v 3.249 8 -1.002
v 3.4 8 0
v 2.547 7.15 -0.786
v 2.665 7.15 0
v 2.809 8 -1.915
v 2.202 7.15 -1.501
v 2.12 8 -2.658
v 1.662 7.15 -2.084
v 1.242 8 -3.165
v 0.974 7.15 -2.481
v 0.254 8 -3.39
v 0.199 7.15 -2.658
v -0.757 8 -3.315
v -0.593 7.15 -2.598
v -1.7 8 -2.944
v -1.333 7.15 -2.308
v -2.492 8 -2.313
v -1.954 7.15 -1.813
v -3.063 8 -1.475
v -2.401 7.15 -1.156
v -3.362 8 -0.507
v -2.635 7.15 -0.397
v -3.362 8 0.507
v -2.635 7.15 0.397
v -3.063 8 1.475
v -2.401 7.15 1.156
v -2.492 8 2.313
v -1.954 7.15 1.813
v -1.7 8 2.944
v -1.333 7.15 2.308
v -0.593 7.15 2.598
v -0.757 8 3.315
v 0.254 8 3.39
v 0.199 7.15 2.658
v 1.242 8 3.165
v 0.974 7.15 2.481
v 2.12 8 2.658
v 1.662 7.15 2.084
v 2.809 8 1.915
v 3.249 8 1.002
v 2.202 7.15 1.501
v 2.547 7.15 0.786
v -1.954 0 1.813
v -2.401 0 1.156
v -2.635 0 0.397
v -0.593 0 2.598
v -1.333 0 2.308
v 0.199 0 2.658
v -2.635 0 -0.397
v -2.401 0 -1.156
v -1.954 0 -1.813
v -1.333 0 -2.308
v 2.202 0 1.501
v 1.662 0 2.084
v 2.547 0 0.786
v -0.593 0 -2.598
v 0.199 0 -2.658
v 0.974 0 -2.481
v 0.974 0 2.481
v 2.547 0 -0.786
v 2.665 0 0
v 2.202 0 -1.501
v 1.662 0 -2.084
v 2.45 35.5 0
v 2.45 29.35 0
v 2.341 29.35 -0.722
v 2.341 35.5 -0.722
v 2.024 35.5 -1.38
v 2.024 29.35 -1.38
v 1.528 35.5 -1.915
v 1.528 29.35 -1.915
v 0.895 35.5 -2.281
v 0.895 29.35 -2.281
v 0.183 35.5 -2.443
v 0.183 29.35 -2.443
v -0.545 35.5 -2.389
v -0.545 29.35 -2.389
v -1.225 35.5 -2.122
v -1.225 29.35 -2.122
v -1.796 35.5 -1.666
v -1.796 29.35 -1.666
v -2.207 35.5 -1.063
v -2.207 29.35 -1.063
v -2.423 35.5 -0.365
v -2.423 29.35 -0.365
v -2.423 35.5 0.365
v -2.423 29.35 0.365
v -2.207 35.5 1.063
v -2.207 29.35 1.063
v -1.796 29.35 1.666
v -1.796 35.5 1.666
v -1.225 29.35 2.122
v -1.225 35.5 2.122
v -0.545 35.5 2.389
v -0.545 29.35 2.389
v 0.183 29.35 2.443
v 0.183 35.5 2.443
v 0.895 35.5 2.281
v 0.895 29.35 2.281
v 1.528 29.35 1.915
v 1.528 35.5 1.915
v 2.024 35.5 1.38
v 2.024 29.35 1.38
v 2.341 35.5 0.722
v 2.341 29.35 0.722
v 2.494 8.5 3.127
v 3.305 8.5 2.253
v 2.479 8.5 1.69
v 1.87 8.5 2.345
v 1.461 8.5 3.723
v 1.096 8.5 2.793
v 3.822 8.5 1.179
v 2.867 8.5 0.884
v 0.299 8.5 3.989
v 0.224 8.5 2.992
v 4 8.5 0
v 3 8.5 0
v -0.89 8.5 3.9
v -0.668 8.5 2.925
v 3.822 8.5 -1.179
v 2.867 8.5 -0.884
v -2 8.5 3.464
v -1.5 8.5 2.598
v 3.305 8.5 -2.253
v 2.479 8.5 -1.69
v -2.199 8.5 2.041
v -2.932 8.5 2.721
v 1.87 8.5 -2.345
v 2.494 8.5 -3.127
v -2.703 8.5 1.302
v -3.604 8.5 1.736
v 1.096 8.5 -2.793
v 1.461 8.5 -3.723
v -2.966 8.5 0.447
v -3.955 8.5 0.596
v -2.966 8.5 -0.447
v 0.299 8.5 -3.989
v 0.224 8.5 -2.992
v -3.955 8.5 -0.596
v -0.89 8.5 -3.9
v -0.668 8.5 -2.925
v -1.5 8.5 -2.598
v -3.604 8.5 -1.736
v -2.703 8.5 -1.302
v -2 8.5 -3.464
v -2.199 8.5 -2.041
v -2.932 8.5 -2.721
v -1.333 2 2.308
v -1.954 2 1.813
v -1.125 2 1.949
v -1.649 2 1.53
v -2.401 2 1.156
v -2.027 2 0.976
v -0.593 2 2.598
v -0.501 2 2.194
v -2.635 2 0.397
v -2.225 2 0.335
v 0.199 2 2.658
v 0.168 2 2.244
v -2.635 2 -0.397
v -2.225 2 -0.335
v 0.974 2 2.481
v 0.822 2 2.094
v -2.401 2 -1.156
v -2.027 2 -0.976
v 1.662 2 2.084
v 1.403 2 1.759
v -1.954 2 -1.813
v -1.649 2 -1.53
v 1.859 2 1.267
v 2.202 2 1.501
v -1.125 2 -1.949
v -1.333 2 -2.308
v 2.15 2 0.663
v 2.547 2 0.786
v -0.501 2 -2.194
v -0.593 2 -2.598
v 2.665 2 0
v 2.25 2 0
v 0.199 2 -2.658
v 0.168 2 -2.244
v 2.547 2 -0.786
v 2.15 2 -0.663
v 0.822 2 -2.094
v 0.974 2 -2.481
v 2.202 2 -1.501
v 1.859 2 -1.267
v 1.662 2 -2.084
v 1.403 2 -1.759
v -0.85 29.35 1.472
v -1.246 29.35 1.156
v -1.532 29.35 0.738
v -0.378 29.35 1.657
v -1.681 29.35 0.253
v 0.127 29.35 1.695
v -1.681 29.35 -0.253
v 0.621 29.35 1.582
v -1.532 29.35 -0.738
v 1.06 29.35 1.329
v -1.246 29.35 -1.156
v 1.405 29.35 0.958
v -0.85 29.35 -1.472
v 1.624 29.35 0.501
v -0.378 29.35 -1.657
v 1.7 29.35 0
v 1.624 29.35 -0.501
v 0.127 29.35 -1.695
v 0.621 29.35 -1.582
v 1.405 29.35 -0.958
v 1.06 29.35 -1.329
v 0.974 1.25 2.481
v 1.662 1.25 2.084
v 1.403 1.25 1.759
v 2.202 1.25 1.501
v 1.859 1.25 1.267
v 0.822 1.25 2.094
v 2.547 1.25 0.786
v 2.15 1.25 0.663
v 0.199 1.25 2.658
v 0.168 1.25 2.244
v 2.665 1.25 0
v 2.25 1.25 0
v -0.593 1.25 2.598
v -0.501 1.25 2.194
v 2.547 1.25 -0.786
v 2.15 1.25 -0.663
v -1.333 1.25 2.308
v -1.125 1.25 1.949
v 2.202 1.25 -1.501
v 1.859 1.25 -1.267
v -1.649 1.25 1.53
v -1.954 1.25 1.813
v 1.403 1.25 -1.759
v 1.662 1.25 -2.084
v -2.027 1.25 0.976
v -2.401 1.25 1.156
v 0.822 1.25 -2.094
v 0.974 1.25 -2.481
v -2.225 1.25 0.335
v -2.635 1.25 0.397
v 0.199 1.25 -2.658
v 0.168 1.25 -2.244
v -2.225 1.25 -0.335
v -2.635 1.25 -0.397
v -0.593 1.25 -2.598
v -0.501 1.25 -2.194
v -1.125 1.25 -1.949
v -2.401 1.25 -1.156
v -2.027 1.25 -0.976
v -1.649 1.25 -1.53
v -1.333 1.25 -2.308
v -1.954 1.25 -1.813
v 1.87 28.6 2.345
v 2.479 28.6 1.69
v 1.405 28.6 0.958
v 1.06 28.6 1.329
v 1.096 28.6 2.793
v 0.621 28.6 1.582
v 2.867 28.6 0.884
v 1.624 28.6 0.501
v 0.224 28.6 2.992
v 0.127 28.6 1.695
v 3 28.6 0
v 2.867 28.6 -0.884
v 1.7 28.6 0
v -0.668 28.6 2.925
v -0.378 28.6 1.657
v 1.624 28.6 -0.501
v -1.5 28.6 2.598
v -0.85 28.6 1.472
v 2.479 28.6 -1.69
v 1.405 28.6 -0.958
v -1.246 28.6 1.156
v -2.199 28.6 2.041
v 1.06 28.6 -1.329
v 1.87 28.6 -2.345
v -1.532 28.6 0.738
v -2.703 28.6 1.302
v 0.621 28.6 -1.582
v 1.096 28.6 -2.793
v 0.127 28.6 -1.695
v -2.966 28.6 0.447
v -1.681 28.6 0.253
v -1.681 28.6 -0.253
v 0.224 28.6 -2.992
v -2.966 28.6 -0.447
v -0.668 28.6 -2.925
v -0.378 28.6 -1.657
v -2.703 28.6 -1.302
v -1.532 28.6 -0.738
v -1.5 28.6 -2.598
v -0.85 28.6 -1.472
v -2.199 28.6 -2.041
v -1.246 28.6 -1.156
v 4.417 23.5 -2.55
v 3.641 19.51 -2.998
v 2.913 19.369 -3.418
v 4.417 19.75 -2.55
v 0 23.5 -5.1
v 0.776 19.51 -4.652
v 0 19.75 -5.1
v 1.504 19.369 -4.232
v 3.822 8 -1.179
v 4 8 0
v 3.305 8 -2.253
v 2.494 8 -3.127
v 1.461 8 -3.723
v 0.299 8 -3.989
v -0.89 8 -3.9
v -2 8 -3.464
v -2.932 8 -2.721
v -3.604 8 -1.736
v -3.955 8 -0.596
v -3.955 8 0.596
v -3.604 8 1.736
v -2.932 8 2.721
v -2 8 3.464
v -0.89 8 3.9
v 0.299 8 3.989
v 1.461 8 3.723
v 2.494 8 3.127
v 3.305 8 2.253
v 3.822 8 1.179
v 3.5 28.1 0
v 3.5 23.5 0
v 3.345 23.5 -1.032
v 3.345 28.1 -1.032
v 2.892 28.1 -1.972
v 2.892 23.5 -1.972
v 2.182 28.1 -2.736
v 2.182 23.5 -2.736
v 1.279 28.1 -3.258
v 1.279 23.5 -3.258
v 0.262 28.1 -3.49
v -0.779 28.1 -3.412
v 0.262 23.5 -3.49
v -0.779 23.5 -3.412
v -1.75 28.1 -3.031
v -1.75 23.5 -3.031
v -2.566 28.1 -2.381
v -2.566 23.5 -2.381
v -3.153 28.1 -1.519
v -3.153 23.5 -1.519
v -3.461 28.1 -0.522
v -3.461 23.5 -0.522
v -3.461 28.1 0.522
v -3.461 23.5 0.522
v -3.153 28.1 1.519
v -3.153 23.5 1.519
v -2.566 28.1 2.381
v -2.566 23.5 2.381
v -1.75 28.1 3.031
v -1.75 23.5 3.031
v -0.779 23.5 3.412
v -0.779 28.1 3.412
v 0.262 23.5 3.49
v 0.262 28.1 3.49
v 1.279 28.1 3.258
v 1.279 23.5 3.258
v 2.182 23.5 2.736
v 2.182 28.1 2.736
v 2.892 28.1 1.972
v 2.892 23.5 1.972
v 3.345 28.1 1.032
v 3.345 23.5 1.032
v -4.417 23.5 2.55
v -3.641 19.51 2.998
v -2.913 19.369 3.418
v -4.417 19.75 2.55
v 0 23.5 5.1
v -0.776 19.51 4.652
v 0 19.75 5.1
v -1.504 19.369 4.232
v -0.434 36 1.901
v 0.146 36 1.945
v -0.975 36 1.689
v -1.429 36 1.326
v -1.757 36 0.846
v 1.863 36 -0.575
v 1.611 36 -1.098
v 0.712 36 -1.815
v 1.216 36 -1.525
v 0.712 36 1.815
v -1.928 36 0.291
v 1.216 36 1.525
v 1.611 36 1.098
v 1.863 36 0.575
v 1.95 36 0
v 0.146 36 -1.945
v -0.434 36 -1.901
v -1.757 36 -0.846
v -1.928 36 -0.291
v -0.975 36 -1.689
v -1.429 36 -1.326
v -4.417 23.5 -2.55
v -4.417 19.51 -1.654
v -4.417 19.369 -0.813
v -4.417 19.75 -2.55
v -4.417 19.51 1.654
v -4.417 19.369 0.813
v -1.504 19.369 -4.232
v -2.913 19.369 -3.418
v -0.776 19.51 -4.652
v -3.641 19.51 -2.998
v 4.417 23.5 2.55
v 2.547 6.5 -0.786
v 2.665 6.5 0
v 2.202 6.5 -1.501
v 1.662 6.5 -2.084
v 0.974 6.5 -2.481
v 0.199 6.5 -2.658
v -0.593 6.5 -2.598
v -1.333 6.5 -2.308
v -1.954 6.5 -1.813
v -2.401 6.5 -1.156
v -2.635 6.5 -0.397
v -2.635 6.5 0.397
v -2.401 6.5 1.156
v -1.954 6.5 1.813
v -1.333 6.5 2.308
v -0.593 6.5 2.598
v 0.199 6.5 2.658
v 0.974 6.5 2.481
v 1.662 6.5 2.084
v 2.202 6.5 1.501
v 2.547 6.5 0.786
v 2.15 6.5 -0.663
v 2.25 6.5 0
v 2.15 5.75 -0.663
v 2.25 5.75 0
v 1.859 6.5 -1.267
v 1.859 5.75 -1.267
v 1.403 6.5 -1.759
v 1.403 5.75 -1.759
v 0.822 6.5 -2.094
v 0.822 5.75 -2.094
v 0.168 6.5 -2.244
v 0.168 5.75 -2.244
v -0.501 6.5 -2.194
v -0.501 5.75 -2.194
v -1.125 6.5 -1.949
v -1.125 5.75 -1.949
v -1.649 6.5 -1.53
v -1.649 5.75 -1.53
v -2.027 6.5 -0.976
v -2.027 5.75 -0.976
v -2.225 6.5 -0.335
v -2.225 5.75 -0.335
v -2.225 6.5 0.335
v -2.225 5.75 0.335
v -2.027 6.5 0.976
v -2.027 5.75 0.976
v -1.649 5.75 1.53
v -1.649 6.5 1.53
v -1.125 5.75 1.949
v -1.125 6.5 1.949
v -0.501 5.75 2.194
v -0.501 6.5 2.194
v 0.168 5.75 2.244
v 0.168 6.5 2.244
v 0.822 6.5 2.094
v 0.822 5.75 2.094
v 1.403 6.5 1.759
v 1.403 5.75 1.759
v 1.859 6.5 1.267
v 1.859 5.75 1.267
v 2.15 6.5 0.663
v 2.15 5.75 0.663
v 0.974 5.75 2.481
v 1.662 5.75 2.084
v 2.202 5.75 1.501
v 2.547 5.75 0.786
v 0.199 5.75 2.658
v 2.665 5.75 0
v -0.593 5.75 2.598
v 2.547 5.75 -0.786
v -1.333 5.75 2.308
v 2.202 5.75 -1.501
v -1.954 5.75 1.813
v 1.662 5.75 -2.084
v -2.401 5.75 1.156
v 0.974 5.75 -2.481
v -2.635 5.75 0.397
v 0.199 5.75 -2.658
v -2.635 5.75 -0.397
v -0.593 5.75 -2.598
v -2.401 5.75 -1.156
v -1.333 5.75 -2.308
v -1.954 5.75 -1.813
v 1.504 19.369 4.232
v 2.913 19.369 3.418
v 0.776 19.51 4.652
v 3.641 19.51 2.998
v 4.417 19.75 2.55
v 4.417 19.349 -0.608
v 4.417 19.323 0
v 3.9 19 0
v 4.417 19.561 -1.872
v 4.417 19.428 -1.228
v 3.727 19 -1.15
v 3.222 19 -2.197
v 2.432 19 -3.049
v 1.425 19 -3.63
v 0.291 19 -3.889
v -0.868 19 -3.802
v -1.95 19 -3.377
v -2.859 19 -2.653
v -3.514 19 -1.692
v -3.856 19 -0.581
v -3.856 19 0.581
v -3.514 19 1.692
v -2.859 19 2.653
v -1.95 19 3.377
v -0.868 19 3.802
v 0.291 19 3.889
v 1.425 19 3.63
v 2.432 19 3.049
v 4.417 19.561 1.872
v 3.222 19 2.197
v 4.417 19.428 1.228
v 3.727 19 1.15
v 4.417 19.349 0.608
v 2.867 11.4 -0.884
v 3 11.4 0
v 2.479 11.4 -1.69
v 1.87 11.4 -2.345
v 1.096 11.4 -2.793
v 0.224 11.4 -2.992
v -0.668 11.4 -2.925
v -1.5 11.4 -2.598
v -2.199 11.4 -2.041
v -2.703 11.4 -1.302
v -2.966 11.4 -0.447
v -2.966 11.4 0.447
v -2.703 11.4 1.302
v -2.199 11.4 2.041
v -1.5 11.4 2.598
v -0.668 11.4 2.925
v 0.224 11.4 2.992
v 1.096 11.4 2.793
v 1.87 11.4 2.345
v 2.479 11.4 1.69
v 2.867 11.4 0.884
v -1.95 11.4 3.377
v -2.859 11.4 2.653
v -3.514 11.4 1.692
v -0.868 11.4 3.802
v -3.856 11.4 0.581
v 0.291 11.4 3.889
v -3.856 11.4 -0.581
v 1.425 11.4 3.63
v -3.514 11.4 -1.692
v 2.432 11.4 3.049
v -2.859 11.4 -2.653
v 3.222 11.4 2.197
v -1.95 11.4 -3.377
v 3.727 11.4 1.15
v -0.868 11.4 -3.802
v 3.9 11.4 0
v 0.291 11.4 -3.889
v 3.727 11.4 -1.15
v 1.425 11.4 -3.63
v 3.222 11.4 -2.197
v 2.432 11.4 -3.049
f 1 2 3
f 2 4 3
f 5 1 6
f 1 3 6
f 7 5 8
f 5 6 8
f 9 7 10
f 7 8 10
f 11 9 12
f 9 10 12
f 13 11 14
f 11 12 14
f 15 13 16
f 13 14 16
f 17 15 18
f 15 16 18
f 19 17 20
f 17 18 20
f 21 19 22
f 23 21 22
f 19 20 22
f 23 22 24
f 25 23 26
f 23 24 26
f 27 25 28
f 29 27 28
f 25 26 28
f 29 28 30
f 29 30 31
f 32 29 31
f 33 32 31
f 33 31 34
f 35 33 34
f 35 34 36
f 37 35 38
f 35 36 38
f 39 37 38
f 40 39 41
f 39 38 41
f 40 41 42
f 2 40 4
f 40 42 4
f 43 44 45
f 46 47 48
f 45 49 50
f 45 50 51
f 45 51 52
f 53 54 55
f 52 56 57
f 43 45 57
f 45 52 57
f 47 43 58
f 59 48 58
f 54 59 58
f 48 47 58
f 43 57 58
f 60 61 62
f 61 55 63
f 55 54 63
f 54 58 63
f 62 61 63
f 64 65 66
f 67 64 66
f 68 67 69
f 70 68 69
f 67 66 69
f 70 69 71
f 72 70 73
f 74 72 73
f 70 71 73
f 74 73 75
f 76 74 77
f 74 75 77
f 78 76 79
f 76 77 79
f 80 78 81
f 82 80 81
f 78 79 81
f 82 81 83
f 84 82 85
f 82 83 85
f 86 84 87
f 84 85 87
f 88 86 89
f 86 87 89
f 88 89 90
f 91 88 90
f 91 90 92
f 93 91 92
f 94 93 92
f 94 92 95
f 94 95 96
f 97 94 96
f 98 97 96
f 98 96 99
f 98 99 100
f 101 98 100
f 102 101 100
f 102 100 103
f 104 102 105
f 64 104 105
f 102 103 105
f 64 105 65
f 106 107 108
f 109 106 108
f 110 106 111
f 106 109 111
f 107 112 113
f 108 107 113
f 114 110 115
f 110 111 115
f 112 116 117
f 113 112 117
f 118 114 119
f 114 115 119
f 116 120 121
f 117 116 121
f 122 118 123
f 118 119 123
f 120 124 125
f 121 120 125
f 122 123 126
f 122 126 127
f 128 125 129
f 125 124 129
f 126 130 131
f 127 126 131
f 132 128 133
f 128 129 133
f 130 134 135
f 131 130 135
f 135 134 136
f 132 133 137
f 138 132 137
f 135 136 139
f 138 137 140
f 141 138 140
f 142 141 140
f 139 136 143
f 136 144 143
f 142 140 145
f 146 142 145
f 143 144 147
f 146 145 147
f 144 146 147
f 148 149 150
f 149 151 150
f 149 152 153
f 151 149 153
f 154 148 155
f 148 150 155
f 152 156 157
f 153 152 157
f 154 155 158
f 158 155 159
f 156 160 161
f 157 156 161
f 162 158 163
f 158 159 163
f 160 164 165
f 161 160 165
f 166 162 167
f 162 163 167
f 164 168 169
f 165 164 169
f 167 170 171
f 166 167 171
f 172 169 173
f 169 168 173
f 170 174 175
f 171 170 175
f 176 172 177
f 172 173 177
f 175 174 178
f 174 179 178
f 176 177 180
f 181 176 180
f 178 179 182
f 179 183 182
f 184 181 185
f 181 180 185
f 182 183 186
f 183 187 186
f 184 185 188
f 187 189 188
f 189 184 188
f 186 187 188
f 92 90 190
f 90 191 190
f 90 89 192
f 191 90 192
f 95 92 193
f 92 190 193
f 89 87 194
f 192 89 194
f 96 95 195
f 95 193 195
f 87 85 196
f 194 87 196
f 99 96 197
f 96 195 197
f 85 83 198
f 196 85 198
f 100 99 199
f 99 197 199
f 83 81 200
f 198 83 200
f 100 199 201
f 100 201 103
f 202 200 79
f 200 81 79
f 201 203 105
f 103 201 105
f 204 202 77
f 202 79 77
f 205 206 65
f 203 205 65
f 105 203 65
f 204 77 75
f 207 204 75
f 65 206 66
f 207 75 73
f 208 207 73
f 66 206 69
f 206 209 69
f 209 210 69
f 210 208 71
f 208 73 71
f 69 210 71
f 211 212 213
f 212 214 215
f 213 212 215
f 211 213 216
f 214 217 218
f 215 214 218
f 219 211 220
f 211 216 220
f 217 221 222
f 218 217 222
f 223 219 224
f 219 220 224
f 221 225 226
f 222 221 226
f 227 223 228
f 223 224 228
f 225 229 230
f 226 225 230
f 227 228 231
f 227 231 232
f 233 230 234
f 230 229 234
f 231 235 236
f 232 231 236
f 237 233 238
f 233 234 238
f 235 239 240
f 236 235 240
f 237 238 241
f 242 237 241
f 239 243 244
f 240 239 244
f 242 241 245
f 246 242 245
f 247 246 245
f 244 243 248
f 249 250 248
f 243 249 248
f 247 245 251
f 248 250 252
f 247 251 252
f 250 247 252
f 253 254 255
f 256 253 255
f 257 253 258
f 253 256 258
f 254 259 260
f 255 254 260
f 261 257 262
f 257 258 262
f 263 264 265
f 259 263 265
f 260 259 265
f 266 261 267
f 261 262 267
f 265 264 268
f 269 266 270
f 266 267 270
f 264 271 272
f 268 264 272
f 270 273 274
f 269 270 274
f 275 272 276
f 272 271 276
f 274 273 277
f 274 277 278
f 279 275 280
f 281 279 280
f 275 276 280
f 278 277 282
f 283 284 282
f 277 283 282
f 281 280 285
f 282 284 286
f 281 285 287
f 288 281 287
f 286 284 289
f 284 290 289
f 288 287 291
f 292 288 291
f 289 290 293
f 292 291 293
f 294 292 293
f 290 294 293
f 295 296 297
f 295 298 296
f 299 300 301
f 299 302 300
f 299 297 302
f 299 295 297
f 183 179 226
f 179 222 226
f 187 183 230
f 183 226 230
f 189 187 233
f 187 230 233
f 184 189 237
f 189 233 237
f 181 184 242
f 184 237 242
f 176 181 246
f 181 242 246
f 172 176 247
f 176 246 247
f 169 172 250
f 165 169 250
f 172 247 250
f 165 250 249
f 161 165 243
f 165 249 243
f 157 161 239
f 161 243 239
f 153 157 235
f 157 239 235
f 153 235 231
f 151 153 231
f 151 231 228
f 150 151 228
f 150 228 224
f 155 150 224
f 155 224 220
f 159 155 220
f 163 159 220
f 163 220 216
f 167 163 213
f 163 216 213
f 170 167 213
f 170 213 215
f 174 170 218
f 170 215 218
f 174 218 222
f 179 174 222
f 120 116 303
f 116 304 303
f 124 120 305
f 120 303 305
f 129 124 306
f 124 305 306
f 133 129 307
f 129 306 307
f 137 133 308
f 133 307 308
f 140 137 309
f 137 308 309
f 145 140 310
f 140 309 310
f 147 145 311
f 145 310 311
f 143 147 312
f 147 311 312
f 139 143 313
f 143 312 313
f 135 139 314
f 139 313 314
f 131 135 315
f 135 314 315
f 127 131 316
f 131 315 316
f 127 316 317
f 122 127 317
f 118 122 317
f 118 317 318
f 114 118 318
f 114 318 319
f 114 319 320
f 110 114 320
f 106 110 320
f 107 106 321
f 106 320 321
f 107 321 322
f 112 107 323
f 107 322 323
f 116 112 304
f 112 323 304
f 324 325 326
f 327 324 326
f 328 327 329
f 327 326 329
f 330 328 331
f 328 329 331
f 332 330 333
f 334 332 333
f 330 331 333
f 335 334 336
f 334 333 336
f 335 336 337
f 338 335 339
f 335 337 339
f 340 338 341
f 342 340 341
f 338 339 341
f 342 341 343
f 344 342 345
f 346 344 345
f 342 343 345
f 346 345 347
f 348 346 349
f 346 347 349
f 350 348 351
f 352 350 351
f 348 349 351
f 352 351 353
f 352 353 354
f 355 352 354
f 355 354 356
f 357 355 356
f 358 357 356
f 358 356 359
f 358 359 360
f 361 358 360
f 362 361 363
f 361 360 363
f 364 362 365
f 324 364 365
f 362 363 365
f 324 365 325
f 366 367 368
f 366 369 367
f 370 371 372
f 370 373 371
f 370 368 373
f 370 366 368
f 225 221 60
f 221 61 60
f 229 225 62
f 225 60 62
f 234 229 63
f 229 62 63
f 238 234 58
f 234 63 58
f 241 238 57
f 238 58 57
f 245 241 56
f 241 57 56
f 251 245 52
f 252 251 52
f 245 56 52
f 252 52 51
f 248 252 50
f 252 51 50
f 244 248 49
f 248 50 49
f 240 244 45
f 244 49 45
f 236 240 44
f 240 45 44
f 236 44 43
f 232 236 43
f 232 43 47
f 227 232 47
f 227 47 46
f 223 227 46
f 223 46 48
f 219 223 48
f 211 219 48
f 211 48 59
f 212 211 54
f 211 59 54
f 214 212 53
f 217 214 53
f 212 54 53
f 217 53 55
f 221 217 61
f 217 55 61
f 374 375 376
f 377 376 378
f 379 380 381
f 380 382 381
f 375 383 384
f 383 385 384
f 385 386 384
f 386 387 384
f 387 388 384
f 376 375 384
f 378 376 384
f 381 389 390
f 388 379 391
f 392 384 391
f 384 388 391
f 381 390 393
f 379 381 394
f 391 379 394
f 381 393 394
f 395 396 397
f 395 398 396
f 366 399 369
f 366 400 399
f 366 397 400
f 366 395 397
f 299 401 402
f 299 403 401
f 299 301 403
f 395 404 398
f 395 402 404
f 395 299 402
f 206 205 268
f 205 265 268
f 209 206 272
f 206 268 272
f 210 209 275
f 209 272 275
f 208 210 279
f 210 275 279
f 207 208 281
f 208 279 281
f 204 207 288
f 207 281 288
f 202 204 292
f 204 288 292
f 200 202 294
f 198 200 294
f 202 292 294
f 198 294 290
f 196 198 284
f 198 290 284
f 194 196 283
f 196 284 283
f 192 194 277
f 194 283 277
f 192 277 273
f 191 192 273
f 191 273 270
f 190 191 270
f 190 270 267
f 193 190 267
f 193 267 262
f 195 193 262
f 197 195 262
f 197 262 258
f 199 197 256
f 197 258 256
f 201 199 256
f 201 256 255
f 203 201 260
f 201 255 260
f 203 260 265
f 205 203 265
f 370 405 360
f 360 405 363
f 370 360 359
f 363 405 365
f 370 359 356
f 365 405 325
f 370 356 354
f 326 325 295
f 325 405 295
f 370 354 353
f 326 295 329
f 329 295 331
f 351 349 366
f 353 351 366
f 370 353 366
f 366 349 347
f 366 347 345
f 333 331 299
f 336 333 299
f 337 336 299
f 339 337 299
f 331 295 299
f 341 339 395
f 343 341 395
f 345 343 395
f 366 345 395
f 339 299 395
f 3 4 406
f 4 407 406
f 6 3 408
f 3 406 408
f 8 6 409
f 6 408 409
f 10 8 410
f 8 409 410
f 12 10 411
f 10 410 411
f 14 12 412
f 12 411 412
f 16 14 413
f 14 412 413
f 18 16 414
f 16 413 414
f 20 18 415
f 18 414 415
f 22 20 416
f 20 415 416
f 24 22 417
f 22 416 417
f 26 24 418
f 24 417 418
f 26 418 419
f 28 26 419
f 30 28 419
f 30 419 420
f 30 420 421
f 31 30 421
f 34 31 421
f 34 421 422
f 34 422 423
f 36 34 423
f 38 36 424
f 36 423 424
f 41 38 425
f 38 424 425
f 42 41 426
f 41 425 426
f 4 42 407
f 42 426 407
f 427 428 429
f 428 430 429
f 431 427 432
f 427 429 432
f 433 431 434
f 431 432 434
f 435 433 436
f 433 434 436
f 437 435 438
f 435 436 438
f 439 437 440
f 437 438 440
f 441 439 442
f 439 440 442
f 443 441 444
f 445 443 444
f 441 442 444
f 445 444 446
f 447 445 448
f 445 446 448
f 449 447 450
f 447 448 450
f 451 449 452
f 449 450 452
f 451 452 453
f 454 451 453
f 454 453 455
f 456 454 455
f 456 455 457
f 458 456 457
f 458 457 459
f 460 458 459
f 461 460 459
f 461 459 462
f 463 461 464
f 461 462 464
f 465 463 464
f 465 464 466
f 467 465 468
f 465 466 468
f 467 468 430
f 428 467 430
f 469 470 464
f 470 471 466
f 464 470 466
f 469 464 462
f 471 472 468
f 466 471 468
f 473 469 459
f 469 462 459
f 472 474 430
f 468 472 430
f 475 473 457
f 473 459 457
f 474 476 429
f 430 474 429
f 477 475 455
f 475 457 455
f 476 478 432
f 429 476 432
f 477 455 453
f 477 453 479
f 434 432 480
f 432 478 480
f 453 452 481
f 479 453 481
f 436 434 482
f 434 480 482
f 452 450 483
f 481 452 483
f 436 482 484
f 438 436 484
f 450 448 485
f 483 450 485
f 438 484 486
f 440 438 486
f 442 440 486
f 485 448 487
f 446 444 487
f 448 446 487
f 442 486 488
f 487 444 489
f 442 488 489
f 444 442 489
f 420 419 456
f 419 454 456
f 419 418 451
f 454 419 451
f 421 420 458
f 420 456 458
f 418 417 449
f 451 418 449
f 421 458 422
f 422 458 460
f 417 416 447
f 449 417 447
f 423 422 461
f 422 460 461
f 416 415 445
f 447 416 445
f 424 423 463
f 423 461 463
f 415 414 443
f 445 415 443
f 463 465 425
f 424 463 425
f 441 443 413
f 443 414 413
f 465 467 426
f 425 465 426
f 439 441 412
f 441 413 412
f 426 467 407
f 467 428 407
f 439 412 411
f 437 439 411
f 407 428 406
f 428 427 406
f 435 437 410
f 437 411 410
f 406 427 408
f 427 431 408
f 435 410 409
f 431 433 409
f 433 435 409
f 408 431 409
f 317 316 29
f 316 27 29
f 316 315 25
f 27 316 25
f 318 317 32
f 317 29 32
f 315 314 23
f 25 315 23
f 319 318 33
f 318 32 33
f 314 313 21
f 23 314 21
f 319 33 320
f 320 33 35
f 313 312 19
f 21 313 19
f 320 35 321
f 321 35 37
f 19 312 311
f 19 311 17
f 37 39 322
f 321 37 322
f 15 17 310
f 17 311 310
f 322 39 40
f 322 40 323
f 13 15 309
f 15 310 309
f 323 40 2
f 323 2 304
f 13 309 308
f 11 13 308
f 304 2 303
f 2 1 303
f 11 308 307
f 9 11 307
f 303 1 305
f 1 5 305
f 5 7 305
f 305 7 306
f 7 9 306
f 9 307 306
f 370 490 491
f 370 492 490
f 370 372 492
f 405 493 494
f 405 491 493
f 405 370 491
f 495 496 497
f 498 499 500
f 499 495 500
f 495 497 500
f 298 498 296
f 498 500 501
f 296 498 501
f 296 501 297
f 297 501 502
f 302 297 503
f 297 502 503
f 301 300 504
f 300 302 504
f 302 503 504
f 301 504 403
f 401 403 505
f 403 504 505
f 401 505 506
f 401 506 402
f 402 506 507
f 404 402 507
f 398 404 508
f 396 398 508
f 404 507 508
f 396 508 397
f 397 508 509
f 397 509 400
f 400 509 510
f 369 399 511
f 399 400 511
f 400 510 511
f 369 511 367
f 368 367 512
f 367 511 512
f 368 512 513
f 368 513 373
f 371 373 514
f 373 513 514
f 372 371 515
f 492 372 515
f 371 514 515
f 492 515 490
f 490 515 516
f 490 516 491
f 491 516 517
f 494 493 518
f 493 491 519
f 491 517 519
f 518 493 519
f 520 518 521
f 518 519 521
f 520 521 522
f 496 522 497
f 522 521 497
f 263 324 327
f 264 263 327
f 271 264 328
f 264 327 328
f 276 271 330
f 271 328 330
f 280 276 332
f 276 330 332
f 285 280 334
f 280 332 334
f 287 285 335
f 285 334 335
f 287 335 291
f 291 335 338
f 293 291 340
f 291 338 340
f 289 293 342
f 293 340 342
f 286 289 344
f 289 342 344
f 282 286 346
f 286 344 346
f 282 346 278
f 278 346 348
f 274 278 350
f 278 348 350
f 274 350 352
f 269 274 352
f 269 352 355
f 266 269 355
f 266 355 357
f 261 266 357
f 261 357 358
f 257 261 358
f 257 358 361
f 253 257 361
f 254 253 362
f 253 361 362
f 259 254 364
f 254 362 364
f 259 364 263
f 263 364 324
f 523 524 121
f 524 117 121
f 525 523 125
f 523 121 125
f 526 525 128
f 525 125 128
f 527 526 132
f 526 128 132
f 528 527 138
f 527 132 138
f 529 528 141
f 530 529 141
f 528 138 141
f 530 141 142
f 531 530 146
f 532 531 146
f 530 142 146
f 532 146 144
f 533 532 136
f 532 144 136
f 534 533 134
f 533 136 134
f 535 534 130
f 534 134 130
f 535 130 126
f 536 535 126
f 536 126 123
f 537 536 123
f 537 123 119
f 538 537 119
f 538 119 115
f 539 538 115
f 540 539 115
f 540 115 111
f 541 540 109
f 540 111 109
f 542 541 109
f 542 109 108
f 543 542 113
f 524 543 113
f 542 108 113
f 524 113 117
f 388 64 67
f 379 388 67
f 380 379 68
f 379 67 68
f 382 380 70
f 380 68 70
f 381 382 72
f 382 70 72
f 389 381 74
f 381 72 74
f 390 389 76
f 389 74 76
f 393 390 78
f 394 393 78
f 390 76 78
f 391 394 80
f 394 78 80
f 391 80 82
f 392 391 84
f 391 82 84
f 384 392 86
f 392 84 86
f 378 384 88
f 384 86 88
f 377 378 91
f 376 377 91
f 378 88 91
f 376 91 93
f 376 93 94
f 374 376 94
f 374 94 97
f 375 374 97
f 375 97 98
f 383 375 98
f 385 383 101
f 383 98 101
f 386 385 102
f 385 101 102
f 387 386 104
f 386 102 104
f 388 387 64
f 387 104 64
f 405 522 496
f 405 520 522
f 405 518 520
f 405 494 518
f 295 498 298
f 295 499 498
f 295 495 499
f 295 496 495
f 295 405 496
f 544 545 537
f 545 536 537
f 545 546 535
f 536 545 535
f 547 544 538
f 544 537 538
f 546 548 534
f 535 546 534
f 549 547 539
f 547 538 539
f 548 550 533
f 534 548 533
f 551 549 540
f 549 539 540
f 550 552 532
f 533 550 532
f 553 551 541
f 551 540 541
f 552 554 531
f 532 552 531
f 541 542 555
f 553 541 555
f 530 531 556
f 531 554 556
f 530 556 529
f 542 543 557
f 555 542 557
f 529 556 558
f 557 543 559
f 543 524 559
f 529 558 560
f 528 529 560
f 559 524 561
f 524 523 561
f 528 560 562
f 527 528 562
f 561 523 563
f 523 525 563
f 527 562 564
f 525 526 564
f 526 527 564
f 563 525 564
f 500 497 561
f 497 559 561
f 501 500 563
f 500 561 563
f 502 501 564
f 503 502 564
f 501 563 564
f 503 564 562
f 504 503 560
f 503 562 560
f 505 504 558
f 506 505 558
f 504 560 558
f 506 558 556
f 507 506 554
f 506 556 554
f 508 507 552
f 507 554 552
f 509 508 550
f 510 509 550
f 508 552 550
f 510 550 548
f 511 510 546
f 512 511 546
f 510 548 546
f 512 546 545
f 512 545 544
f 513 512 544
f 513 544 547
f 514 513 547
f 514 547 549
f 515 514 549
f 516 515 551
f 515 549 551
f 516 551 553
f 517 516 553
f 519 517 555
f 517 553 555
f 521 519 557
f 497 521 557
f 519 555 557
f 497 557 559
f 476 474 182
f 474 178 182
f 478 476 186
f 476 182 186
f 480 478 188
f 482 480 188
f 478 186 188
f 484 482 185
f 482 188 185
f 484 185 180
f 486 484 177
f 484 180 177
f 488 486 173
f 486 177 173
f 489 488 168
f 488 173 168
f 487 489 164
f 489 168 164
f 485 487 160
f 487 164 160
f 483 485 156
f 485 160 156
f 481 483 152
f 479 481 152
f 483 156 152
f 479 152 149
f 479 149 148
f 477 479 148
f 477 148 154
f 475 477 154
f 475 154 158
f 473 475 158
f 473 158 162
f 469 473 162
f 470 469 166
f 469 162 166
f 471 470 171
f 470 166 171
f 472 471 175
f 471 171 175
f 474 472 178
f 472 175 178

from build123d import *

# Parameters (mm, degrees)
SKETCH001_R  = 6
POCKET_DEPTH = 5
CHAMFER_SIZE = 0.5


with BuildPart() as part:
    # Sketch → Revolution (revolve)
    with BuildSketch(Plane.XY):
        Polygon((0, 0), (0, 36), (2.45, 36), (2.45, 29.35), (1.7, 29.35), (1.7, 28.6), (3.5, 28.6), (3.5, 23.5), (5.1, 23.5), (5.1, 19.75), (3.9, 19), (3.9, 11.4), (3, 11.4), (3, 8.5), (4, 8.5), (4, 8), (3.4, 8), (2.665, 7.15), (2.665, 6.5), (2.25, 6.5), (2.25, 5.75), (2.665, 5.75), (2.665, 2), (2.25, 2), (2.25, 1.25), (2.665, 1.25), (2.665, 0), align=None)
    revolve(axis=Axis((0, 0, 0), (0, 1, 0)))

    # Sketch001 (on DatumPlane) → Pocket (cut)
    with BuildSketch(Plane(origin=(0, 23.5, 0), x_dir=(-1, 0, 0), z_dir=(0, 1, 0))):
        Circle(SKETCH001_R)
        Polygon((4.41673, 2.55), (0, 5.1), (-4.41673, 2.55), (-4.41673, -2.55), (0, -5.1), (4.41673, -2.55), align=None, mode=Mode.SUBTRACT)
    extrude(amount=-POCKET_DEPTH, mode=Mode.SUBTRACT)

    # Chamfer
    chamfer_edges = [part.edges().sort_by_distance(p)[0] for p in [
        (4.158365, 19.161478, 0),
        (2.25, 1.625, 0),
        (-3.5, 28.6, 0),
        (-2.45, 36, 0),
    ]]
    chamfer(chamfer_edges, length=CHAMFER_SIZE)


solid = part.part
